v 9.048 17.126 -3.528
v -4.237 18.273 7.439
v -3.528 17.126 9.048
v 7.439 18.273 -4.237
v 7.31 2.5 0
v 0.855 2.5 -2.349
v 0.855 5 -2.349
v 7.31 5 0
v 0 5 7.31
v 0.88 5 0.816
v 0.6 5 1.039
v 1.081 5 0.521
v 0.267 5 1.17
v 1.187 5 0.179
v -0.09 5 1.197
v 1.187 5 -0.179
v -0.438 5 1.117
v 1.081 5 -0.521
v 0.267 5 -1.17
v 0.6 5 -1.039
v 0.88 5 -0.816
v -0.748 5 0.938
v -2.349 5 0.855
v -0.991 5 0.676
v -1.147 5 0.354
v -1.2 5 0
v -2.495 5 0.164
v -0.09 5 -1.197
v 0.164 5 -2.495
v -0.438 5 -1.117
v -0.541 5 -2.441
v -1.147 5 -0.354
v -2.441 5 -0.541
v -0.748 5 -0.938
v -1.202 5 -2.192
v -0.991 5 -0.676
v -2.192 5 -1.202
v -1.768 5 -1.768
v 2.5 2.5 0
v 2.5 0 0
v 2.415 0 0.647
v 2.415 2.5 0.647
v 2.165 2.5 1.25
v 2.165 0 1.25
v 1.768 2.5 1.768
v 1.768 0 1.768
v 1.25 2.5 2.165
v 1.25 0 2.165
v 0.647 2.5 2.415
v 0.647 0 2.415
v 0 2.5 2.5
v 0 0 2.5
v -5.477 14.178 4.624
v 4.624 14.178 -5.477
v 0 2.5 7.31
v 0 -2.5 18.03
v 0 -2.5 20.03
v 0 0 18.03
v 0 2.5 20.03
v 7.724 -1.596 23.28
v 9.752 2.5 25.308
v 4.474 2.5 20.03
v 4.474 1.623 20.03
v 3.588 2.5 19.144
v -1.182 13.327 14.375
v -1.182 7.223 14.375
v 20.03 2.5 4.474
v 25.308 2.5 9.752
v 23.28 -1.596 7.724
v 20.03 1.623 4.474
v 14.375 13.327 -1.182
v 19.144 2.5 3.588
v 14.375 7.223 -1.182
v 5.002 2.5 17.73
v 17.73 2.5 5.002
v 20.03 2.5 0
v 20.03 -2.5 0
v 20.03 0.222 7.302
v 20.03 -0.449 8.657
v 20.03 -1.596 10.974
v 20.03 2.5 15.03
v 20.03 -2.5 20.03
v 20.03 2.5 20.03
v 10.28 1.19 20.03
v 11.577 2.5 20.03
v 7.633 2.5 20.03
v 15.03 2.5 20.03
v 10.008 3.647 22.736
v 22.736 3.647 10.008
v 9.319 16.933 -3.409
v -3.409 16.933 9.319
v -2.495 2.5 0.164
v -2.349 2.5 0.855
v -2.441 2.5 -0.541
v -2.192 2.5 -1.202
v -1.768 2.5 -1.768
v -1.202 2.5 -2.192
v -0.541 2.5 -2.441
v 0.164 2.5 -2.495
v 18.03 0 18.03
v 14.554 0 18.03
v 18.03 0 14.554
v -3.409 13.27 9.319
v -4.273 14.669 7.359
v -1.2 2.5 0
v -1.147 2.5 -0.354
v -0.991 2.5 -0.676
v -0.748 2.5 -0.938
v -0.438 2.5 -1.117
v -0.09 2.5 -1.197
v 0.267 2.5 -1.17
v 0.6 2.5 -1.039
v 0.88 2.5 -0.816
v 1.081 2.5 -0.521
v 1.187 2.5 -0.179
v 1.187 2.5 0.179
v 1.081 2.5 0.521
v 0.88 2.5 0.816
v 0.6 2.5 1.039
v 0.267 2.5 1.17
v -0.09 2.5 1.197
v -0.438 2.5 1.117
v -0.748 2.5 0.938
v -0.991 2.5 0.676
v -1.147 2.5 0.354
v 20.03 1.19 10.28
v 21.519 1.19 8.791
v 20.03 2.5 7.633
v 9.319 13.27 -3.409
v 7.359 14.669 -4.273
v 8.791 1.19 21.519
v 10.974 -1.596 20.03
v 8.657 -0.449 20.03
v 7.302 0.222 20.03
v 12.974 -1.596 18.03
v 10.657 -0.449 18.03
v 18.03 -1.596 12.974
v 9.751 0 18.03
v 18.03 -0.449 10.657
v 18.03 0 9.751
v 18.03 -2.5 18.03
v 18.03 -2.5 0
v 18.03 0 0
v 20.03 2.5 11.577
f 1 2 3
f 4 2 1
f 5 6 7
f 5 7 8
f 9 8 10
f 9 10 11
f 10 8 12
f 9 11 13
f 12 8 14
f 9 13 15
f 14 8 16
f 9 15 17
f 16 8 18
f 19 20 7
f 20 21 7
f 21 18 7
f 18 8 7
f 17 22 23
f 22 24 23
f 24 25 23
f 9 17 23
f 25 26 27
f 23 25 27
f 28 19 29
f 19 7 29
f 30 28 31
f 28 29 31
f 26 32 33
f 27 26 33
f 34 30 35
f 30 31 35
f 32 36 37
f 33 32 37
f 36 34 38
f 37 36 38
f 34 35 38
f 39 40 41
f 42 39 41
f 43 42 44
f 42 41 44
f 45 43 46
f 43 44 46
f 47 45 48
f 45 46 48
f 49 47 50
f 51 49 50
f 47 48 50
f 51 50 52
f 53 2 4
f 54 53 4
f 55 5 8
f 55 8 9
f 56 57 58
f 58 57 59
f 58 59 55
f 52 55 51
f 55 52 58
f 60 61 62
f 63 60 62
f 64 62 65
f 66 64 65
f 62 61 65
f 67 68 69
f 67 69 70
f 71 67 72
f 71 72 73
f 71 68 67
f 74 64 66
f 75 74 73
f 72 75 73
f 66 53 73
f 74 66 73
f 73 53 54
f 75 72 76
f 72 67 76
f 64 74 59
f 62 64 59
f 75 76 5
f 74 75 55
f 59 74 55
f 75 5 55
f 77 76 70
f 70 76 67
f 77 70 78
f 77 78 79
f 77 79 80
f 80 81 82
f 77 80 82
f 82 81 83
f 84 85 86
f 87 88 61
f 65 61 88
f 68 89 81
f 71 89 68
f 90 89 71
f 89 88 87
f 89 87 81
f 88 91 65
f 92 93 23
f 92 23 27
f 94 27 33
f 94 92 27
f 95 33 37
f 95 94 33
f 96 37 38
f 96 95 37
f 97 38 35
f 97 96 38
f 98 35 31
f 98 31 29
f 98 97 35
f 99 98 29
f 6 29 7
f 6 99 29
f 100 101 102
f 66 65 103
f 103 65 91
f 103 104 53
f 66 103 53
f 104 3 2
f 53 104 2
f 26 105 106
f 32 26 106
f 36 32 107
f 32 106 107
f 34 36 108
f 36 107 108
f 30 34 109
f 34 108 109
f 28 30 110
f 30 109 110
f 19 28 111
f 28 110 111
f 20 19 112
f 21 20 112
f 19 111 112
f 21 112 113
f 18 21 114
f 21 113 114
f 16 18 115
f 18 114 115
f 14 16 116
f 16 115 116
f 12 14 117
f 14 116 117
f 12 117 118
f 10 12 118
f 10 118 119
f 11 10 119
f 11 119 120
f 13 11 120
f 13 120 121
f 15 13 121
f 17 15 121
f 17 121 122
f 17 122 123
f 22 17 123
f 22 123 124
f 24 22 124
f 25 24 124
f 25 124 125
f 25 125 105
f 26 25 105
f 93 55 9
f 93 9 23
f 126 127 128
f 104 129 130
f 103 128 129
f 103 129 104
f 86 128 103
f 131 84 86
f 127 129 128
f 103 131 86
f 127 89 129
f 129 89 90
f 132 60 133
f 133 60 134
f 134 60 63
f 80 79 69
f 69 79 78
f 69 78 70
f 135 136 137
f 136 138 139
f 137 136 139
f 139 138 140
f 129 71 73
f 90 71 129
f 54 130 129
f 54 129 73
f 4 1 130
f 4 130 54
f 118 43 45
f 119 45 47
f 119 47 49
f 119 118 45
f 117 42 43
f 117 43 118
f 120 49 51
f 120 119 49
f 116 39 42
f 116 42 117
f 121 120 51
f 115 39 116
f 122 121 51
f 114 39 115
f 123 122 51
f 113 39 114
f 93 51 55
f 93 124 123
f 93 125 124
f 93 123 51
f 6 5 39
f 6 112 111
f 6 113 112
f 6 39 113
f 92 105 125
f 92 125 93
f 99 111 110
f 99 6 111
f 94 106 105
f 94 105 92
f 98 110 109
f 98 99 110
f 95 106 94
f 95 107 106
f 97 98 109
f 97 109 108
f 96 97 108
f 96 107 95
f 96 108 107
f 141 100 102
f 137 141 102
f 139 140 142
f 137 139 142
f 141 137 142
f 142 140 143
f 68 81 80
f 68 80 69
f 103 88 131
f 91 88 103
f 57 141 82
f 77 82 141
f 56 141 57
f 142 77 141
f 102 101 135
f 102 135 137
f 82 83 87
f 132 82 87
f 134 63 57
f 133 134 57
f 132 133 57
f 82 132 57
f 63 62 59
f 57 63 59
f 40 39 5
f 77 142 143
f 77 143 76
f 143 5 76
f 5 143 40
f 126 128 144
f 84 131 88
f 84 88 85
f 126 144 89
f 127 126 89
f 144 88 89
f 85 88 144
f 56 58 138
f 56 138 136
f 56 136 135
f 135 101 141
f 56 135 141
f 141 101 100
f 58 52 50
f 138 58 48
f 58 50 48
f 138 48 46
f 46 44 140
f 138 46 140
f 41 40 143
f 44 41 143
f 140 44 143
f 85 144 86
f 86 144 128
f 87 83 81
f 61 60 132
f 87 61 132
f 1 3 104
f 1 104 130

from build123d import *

# Parameters (mm, degrees)
BOSS_EXTRUDE1_DEPTH      = 2.5
BOSS_EXTRUDE2_DEPTH      = 5
BOSS_EXTRUDE3_DEPTH      = 2.5
SKETCH7_W                = 22
SKETCH7_H                = 27.5
SKETCH7_W_2              = 18
SKETCH7_H_2              = 23.5
BOSS_EXTRUDE4_DEPTH      = 5
M2_CLEARANCE_HOLE1_D     = 2.4
M2_CLEARANCE_HOLE1_DEPTH = 7.5
BOSS_EXTRUDE5_DEPTH      = 2
CUT_EXTRUDE5_DEPTH       = 42.382841321


with BuildPart() as part:
    # Sketch1 → Boss-Extrude1 (new body)
    with BuildSketch(Plane(origin=(0, 0, 0), x_dir=(1, 0, 0), z_dir=(0, 1, 0))):
        with BuildLine():
            Line((0, -2.5), (0, -18.03))
            Line((0, -18.03), (18.03, -18.03))
            Line((18.03, -18.03), (18.03, 0))
            Line((18.03, 0), (2.5, 0))
            ThreePointArc((2.5, 0), (1.767766953, -1.767766953), (0, -2.5))
        make_face()
    extrude(amount=BOSS_EXTRUDE1_DEPTH)

    # Sketch2 → Boss-Extrude2 (add)
    with BuildSketch(Plane(origin=(0, 2.5, 0), x_dir=(1, 0, 0), z_dir=(0, 1, 0))):
        Polygon((0, -20.03), (0, -18.03), (18.03, -18.03), (18.03, 0), (20.03, 0), (20.03, -20.03), align=None)
    extrude(amount=-BOSS_EXTRUDE2_DEPTH)

    # Sketch3 → Boss-Extrude3 (add)
    with BuildSketch(Plane(origin=(0, 2.5, 0), x_dir=(1, 0, 0), z_dir=(0, 1, 0))):
        with BuildLine():
            Line((0.855050358, 2.349231552), (7.309511, 0))
            Line((7.309511, 0), (0, -7.309511))
            Line((0, -7.309511), (-2.349231552, -0.855050358))
            ThreePointArc((-2.349231552, -0.855050358), (-1.767766953, 1.767766953), (0.855050358, 2.349231552))
        make_face()
    extrude(amount=BOSS_EXTRUDE3_DEPTH)

    # Sketch7 → Boss-Extrude4 (add)
    with BuildSketch(Plane(origin=(6.597772224, 13.325561997, 6.597772224), x_dir=(0.7071067811865464, 0, -0.7071067811865488), z_dir=(0.40557978767264036, 0.819152044288991, 0.40557978767263897))):
        with Locations((0, -5.123791374)):
            Rectangle(SKETCH7_W, SKETCH7_H)
        with Locations((0, -5.123791374)):
            Rectangle(SKETCH7_W_2, SKETCH7_H_2, mode=Mode.SUBTRACT)
    extrude(amount=-BOSS_EXTRUDE4_DEPTH)

    # M2 Clearance Hole1
    with Locations(Plane(origin=(0, 5, 0), x_dir=(1, 0, 0), z_dir=(0, 1, 0))):
        with Locations((0, 0)):
            Hole(M2_CLEARANCE_HOLE1_D / 2, depth=M2_CLEARANCE_HOLE1_DEPTH)

    # Sketch10 → Boss-Extrude5 (add)
    with BuildSketch(Plane(origin=(4.569873286, 9.229801775, 4.569873286), x_dir=(0.9117676909005845, -0.3311545099281039, -0.24293284747866747), z_dir=(-0.40557978767264047, -0.8191520442889909, -0.40557978767263886))):
        Polygon((-13.961806263, -0.692416888), (1.91532614, 21.761239087), (19.878250921, 9.059533165), (4.001118518, -13.394122811), align=None)
    extrude(amount=-BOSS_EXTRUDE5_DEPTH)

    # Sketch13 → Cut-Extrude5 (cut, through all)
    with BuildSketch(Plane(origin=(0, 18.273352, 0), x_dir=(1, 0, 0), z_dir=(0, 1, 0))):
        Polygon((-8.346263934, -7.351506608), (-1.070246696, -14.627523847), (-5.52058621, -4.525828883), align=None)
        Polygon((7.351506608, 8.346263934), (14.627523847, 1.070246696), (4.525828883, 5.52058621), align=None)
    extrude(amount=-CUT_EXTRUDE5_DEPTH, mode=Mode.SUBTRACT)


solid = part.part
